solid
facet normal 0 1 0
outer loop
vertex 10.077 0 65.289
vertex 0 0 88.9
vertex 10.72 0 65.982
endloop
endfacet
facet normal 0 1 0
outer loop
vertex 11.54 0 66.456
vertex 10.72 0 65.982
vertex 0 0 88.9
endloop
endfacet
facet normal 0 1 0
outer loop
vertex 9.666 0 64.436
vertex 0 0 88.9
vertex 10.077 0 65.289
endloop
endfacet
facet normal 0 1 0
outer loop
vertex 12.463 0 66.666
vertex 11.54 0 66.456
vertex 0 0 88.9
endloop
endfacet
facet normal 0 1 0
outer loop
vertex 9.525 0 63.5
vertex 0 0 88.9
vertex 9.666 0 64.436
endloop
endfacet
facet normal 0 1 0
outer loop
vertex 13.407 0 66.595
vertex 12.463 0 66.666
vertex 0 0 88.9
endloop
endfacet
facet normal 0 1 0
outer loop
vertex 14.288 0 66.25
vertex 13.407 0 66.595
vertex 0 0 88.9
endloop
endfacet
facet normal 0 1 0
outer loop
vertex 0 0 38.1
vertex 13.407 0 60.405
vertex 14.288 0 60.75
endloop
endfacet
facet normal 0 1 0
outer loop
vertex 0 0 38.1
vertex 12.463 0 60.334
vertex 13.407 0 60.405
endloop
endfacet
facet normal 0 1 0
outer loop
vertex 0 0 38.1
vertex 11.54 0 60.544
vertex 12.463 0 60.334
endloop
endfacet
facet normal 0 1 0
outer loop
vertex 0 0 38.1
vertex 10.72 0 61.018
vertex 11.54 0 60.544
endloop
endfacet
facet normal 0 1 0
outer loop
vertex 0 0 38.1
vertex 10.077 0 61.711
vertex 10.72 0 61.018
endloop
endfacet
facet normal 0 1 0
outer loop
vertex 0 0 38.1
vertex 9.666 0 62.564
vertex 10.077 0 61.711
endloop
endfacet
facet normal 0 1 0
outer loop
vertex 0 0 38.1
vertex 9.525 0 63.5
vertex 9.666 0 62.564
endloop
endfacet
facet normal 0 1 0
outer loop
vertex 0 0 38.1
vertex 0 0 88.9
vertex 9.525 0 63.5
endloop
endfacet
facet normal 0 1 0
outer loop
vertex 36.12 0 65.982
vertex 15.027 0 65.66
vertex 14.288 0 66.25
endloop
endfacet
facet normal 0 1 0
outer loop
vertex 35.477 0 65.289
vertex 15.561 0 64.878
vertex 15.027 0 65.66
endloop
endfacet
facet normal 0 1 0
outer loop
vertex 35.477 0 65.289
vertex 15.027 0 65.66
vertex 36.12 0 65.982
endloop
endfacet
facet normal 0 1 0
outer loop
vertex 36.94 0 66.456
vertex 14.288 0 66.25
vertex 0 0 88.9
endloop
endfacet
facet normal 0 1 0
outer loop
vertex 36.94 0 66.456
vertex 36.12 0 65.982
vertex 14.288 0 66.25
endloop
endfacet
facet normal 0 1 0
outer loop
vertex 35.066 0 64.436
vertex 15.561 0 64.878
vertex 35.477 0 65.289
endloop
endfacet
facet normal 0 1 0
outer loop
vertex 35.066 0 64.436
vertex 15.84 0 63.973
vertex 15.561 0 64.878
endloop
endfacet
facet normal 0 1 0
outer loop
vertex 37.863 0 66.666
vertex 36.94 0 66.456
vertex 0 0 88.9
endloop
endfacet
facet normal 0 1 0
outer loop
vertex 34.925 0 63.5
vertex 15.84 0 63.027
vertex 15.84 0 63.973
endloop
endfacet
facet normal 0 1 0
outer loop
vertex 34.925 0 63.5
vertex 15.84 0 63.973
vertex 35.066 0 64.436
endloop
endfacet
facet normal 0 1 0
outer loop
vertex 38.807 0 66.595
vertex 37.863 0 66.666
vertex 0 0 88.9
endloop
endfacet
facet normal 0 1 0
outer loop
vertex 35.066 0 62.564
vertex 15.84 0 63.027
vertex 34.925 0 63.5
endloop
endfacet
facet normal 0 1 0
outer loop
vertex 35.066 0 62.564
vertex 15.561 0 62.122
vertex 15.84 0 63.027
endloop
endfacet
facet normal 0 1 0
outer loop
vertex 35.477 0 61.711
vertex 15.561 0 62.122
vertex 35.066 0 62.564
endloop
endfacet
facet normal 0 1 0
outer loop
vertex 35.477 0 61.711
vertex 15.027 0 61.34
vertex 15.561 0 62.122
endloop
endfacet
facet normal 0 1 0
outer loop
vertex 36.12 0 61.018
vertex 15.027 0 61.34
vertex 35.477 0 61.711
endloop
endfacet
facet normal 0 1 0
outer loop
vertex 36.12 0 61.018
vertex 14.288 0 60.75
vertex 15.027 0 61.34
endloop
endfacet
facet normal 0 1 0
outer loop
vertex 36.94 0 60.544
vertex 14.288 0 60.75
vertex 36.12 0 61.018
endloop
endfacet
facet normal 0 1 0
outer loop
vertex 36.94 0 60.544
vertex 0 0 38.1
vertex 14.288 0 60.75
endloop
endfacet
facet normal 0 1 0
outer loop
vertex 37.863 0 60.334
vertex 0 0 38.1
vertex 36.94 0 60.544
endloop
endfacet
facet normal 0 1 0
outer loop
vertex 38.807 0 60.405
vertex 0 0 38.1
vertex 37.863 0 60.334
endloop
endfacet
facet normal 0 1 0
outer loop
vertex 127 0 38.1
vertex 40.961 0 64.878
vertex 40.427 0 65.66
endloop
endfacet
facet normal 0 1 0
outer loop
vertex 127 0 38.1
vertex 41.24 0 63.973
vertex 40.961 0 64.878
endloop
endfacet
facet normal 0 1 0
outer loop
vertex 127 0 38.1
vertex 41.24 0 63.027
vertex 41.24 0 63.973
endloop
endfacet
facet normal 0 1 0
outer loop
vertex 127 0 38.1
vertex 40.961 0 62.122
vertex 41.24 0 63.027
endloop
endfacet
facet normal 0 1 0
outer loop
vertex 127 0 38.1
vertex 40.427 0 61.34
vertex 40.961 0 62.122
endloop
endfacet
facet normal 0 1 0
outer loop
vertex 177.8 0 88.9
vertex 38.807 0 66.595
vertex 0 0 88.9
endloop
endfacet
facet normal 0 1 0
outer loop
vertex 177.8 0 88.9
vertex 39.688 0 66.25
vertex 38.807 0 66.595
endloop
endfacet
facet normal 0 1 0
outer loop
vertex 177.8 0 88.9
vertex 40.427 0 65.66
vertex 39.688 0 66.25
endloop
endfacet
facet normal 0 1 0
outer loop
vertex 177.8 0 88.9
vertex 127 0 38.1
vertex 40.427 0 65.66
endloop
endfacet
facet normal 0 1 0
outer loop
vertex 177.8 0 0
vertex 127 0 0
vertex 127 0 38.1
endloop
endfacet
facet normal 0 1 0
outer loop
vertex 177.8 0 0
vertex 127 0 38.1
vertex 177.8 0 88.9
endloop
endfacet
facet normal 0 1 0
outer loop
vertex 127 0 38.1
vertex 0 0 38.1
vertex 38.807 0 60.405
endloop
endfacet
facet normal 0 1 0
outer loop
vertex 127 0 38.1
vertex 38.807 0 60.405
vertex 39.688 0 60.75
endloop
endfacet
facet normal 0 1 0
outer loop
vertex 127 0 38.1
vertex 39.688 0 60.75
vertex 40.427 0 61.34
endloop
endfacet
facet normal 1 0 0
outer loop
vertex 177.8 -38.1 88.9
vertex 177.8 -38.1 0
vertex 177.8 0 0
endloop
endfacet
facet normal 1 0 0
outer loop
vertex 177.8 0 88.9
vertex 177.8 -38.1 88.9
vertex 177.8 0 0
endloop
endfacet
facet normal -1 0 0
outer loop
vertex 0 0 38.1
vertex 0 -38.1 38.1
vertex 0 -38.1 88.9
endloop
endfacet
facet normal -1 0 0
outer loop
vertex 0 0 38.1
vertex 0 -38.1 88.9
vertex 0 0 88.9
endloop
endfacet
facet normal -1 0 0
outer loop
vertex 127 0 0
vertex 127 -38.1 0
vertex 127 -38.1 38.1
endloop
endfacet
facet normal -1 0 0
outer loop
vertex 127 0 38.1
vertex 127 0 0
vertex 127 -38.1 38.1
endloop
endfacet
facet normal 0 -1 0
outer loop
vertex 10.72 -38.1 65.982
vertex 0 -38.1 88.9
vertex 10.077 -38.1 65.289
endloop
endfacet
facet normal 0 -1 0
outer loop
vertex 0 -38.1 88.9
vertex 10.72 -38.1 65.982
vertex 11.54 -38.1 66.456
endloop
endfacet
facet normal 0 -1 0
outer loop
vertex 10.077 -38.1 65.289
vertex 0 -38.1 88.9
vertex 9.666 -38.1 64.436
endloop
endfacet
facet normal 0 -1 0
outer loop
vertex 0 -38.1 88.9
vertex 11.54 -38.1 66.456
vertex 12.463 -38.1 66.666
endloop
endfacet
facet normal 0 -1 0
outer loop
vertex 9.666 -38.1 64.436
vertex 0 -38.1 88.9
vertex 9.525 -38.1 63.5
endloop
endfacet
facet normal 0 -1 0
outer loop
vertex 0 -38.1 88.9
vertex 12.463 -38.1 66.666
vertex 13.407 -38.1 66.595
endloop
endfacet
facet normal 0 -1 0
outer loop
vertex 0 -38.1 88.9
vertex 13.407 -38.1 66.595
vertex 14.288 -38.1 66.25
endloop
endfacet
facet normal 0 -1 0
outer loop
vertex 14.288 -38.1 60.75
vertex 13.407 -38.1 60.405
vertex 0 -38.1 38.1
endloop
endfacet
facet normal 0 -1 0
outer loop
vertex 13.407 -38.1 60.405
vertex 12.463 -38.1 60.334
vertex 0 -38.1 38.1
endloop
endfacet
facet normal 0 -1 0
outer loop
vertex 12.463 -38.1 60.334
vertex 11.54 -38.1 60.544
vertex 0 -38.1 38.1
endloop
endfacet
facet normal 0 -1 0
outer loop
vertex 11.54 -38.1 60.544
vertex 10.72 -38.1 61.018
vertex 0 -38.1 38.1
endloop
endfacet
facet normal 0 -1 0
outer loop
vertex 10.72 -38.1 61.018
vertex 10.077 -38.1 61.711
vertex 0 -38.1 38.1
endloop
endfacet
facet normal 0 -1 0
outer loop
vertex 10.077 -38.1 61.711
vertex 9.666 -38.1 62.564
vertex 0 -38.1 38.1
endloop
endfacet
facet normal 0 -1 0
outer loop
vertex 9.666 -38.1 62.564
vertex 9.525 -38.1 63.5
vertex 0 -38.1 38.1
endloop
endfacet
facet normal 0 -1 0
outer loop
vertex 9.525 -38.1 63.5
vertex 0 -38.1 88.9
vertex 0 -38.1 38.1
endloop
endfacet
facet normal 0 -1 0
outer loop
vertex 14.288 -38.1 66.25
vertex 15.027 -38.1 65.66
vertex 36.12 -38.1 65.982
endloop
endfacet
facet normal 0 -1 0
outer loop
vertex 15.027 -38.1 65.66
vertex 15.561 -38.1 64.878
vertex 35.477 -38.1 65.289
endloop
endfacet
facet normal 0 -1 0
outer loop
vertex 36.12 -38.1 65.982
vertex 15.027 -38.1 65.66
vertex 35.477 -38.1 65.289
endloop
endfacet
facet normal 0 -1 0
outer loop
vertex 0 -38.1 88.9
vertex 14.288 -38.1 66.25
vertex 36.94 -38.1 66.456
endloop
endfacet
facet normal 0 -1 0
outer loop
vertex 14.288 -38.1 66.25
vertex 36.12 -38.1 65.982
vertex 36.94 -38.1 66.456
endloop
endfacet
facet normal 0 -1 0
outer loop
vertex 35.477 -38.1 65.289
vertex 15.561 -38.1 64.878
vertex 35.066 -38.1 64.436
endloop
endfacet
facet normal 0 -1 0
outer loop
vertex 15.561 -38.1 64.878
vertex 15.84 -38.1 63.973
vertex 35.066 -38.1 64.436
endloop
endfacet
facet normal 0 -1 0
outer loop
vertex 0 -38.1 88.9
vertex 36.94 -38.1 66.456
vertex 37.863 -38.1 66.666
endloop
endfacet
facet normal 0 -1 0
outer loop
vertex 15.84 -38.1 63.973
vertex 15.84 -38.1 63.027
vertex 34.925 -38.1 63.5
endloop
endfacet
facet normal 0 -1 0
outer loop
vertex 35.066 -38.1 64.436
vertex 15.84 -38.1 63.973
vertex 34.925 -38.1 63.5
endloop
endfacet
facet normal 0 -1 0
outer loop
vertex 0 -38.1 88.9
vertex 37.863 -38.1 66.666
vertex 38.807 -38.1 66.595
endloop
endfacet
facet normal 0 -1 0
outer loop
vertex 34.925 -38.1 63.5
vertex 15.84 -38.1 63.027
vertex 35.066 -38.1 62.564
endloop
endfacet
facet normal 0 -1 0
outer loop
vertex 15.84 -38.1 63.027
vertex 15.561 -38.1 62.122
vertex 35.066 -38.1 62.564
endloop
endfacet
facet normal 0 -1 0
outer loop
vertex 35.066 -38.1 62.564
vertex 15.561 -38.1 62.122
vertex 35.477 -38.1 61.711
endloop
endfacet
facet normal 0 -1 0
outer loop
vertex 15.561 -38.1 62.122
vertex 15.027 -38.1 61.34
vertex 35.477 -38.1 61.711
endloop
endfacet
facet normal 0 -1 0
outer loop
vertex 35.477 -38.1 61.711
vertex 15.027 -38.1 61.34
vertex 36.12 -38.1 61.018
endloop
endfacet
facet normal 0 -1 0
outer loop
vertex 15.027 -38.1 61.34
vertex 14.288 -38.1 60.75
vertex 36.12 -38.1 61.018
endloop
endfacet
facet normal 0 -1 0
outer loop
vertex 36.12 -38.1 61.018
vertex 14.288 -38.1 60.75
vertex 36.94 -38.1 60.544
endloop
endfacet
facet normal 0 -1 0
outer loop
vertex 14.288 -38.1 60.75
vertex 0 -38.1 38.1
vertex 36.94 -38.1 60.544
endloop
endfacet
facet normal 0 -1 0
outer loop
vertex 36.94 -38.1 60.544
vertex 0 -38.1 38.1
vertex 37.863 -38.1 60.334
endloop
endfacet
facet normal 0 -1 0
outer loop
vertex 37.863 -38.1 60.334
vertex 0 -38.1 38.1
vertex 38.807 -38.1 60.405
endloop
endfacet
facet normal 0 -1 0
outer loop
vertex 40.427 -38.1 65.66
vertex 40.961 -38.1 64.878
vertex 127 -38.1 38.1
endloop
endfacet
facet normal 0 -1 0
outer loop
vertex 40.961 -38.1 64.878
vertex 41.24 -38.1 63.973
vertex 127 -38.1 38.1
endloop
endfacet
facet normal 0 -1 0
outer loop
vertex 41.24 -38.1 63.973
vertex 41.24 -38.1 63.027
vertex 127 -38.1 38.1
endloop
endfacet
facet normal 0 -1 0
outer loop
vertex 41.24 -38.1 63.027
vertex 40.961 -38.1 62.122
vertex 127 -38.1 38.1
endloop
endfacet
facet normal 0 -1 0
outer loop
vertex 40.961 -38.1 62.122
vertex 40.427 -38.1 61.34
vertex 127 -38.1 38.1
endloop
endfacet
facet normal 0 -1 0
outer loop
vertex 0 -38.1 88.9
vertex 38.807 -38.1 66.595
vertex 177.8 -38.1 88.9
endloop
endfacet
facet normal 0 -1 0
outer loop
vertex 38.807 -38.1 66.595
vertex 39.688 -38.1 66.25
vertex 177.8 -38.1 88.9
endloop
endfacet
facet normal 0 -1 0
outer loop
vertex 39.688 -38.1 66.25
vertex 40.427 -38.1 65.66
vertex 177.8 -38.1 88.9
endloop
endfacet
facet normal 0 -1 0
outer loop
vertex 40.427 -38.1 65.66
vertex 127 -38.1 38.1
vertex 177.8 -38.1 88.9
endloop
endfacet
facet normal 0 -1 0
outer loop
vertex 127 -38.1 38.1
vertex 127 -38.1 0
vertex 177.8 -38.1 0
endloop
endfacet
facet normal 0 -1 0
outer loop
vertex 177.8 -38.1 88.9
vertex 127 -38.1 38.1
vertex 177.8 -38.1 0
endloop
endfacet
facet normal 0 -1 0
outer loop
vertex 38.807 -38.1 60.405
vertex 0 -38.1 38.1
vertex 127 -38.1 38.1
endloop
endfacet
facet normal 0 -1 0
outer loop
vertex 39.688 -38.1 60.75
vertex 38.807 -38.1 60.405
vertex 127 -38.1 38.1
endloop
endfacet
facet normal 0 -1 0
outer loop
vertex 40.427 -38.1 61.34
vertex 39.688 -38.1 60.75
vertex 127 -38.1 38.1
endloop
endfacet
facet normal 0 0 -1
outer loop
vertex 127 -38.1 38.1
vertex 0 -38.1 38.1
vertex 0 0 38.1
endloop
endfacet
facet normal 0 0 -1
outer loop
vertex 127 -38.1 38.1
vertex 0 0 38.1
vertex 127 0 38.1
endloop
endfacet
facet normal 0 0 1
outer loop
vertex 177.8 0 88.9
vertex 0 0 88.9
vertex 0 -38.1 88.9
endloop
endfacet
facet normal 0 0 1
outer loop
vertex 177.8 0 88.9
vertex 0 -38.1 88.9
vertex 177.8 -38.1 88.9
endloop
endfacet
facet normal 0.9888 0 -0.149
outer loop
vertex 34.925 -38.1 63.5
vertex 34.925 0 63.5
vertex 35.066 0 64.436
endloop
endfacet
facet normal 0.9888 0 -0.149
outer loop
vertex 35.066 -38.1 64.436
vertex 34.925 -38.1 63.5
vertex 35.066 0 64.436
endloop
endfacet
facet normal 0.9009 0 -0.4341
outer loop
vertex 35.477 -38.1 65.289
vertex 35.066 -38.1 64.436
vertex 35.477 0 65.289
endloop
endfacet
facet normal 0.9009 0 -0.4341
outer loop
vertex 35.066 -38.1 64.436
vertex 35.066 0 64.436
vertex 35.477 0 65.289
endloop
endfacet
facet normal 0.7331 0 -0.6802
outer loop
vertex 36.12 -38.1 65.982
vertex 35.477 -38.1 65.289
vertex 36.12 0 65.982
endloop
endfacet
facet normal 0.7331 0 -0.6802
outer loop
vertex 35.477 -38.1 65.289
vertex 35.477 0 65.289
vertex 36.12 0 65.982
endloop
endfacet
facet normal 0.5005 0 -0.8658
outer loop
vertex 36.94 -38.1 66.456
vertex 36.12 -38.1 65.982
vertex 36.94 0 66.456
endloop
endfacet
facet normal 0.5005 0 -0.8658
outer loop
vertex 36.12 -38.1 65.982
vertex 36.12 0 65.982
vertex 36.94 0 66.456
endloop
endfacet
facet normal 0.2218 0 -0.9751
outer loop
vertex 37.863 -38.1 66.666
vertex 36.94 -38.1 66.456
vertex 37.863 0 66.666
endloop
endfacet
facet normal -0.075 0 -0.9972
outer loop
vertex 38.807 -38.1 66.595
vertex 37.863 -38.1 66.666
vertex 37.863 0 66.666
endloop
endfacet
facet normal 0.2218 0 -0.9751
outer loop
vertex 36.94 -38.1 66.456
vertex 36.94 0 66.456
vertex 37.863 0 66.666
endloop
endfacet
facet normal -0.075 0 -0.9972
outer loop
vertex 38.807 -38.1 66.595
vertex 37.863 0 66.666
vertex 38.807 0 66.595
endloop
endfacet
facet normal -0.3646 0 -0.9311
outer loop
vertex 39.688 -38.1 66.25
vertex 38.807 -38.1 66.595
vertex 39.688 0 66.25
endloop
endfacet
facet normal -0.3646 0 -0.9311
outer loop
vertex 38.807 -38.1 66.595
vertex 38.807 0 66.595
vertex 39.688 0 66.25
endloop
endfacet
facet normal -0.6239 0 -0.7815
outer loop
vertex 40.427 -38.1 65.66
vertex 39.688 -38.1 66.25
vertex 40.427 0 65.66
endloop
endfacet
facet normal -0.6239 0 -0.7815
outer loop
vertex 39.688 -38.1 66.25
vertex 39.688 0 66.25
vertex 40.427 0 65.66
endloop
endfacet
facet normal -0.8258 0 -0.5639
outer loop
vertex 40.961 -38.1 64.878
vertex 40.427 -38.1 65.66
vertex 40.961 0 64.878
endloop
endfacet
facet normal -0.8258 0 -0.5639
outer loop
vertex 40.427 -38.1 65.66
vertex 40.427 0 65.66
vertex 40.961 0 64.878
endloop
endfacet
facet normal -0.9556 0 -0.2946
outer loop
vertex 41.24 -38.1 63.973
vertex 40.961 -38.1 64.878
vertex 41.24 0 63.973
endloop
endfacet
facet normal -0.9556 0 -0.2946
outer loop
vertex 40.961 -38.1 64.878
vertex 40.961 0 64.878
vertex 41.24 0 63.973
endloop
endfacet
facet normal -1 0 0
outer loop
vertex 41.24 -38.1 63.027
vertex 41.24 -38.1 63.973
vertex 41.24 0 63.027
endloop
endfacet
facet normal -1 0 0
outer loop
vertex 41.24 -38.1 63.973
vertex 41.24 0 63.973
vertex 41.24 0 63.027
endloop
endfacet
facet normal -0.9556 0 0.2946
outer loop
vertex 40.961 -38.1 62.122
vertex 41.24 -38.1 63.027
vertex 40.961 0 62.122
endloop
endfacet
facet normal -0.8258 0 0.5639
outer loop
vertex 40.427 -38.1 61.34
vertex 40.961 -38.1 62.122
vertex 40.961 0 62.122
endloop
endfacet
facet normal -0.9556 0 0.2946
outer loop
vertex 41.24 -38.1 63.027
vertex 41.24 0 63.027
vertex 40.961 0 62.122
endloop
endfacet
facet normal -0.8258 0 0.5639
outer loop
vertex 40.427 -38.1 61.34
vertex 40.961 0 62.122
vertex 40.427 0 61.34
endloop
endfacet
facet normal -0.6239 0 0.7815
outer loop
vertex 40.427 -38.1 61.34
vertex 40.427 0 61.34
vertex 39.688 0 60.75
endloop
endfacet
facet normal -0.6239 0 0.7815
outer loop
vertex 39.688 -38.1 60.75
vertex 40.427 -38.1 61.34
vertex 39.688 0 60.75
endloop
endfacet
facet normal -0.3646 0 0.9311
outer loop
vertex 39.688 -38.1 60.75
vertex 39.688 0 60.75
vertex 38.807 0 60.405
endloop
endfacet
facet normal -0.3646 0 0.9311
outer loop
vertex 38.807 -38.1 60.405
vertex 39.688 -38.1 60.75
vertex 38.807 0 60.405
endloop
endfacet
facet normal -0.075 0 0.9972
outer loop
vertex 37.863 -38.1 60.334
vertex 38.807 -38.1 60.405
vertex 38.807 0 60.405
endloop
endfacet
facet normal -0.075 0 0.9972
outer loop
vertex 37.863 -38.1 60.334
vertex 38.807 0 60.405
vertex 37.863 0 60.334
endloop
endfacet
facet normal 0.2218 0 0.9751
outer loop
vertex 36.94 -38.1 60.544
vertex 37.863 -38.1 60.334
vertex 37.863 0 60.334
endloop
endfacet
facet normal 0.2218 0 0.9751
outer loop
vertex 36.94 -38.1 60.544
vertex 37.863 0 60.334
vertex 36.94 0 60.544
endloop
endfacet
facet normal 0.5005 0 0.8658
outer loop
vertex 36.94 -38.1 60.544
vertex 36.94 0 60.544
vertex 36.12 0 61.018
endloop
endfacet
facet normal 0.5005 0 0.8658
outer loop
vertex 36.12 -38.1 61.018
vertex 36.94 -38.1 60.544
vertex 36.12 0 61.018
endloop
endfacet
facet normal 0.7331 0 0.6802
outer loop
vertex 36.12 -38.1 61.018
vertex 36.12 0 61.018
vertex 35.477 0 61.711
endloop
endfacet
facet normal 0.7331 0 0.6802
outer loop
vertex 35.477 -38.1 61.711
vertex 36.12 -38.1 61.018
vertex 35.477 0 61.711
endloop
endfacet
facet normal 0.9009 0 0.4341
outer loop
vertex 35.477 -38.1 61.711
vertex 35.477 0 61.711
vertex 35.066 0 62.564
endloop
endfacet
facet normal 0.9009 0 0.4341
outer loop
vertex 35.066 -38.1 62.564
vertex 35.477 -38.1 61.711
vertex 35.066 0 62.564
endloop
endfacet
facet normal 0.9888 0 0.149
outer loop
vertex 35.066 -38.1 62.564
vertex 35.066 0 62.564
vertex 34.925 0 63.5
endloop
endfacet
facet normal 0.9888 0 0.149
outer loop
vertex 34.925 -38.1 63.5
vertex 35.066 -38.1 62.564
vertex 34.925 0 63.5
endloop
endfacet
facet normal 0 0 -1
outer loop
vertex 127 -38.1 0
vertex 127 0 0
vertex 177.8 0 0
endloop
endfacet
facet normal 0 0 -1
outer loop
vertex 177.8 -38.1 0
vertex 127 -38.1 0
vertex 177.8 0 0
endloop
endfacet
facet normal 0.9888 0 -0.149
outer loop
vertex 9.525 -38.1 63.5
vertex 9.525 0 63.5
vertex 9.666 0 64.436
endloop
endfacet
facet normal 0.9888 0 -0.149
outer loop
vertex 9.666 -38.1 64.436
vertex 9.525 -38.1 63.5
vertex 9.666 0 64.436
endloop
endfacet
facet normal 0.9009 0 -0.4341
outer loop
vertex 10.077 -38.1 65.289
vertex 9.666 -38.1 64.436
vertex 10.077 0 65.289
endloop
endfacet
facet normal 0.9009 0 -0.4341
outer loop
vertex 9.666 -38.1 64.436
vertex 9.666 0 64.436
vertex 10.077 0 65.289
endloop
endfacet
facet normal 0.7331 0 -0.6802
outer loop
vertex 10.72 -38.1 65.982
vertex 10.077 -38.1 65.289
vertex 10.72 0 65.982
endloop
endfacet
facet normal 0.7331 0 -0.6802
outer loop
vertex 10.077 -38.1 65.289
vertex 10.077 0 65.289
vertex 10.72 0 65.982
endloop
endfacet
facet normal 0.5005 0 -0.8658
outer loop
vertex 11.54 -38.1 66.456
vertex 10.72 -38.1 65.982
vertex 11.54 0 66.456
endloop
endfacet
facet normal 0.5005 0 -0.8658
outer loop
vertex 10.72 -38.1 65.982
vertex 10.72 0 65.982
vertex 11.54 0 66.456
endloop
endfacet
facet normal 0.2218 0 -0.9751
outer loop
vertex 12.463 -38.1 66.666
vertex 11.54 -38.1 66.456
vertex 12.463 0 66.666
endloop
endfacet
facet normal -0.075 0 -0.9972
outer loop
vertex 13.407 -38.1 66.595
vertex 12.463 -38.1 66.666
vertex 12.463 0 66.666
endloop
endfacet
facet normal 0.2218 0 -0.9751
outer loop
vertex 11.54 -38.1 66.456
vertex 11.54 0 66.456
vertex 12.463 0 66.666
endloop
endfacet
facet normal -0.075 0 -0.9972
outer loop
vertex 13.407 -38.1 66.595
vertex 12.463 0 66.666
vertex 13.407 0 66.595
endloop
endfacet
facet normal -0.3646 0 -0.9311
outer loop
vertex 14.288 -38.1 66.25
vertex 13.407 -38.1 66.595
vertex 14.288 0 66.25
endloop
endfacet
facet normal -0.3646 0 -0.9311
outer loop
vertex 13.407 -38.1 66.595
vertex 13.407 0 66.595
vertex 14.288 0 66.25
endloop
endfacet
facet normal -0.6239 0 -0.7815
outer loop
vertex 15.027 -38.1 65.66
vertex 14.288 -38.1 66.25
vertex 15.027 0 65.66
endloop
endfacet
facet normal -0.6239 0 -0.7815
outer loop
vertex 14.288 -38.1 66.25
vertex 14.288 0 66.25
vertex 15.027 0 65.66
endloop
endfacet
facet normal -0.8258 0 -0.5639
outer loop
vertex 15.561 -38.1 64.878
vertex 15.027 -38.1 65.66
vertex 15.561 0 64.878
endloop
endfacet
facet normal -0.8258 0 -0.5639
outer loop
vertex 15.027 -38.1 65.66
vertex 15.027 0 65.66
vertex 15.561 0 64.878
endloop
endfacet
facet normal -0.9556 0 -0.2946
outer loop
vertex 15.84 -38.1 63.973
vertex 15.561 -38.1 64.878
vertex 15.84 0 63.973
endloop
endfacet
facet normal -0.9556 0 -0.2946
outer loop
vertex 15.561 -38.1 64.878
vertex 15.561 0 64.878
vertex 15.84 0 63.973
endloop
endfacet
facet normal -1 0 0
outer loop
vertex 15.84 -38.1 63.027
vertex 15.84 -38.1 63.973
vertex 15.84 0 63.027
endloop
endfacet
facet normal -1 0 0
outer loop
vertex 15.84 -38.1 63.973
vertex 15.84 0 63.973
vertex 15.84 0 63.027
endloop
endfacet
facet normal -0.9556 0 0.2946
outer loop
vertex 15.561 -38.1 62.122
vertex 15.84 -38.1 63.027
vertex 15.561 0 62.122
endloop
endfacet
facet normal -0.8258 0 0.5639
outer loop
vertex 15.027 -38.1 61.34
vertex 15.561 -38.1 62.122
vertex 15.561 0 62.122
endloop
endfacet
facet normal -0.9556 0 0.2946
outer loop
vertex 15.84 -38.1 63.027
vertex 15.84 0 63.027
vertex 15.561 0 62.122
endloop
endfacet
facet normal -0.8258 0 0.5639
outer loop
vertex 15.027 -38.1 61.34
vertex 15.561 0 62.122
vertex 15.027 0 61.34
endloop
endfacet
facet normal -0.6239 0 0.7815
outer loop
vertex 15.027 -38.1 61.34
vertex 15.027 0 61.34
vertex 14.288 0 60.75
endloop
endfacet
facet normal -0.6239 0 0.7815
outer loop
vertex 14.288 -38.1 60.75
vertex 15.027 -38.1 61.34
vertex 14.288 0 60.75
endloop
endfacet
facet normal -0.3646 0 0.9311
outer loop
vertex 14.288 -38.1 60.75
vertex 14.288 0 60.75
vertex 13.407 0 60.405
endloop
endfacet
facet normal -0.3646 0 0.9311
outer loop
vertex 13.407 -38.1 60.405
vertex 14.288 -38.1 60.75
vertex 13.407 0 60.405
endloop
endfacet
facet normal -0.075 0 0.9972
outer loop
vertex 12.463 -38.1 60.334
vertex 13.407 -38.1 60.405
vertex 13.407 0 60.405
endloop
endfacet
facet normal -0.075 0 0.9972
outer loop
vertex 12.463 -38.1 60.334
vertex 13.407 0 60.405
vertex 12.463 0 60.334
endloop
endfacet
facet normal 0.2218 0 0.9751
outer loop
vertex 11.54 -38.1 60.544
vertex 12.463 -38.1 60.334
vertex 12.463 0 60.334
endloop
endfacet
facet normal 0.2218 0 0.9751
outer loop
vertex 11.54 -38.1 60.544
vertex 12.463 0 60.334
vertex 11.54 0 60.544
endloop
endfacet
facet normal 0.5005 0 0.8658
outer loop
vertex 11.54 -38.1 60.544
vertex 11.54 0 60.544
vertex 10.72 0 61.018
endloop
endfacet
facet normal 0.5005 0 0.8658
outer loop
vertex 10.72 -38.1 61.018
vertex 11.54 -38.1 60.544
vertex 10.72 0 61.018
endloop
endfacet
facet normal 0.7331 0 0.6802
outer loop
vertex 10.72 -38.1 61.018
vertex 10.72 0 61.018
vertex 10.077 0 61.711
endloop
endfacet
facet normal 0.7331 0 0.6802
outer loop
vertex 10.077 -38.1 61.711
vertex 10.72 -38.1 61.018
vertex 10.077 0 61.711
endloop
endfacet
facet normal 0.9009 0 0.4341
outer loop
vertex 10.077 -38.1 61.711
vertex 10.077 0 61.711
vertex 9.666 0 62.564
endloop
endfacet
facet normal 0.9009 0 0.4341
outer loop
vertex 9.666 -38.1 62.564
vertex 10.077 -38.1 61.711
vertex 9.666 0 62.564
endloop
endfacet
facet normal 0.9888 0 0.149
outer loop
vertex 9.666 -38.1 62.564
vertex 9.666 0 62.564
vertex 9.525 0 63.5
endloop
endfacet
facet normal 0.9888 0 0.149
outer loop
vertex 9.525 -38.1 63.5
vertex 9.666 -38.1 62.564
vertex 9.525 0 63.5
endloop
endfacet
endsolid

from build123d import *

# Parameters (mm, degrees)
F0_W     = 177.8
F0_H     = 38.1
F1_DEPTH = 88.9
F2_W     = 127
F2_H     = 38.1
F3_DEPTH = 38.101
F5_D     = 6.35


with BuildPart() as f1:
    # F0 (on Top) → F1 (new body)
    with BuildSketch(Plane.XY):
        with Locations((88.9, -19.05)):
            Rectangle(F0_W, F0_H)
    extrude(amount=F1_DEPTH)

    # F2 (on face) → F3 (cut, through all)
    with BuildSketch(Plane.XZ.offset(38.1)):
        with Locations((63.5, 19.05)):
            Rectangle(F2_W, F2_H)
    extrude(amount=-F3_DEPTH, mode=Mode.SUBTRACT)

    # F5 (through all)
    with Locations(Plane.XZ.offset(38.1)):
        with Locations((38.1, 63.5), (12.7, 63.5)):
            Hole(F5_D / 2)


solid = f1.part
